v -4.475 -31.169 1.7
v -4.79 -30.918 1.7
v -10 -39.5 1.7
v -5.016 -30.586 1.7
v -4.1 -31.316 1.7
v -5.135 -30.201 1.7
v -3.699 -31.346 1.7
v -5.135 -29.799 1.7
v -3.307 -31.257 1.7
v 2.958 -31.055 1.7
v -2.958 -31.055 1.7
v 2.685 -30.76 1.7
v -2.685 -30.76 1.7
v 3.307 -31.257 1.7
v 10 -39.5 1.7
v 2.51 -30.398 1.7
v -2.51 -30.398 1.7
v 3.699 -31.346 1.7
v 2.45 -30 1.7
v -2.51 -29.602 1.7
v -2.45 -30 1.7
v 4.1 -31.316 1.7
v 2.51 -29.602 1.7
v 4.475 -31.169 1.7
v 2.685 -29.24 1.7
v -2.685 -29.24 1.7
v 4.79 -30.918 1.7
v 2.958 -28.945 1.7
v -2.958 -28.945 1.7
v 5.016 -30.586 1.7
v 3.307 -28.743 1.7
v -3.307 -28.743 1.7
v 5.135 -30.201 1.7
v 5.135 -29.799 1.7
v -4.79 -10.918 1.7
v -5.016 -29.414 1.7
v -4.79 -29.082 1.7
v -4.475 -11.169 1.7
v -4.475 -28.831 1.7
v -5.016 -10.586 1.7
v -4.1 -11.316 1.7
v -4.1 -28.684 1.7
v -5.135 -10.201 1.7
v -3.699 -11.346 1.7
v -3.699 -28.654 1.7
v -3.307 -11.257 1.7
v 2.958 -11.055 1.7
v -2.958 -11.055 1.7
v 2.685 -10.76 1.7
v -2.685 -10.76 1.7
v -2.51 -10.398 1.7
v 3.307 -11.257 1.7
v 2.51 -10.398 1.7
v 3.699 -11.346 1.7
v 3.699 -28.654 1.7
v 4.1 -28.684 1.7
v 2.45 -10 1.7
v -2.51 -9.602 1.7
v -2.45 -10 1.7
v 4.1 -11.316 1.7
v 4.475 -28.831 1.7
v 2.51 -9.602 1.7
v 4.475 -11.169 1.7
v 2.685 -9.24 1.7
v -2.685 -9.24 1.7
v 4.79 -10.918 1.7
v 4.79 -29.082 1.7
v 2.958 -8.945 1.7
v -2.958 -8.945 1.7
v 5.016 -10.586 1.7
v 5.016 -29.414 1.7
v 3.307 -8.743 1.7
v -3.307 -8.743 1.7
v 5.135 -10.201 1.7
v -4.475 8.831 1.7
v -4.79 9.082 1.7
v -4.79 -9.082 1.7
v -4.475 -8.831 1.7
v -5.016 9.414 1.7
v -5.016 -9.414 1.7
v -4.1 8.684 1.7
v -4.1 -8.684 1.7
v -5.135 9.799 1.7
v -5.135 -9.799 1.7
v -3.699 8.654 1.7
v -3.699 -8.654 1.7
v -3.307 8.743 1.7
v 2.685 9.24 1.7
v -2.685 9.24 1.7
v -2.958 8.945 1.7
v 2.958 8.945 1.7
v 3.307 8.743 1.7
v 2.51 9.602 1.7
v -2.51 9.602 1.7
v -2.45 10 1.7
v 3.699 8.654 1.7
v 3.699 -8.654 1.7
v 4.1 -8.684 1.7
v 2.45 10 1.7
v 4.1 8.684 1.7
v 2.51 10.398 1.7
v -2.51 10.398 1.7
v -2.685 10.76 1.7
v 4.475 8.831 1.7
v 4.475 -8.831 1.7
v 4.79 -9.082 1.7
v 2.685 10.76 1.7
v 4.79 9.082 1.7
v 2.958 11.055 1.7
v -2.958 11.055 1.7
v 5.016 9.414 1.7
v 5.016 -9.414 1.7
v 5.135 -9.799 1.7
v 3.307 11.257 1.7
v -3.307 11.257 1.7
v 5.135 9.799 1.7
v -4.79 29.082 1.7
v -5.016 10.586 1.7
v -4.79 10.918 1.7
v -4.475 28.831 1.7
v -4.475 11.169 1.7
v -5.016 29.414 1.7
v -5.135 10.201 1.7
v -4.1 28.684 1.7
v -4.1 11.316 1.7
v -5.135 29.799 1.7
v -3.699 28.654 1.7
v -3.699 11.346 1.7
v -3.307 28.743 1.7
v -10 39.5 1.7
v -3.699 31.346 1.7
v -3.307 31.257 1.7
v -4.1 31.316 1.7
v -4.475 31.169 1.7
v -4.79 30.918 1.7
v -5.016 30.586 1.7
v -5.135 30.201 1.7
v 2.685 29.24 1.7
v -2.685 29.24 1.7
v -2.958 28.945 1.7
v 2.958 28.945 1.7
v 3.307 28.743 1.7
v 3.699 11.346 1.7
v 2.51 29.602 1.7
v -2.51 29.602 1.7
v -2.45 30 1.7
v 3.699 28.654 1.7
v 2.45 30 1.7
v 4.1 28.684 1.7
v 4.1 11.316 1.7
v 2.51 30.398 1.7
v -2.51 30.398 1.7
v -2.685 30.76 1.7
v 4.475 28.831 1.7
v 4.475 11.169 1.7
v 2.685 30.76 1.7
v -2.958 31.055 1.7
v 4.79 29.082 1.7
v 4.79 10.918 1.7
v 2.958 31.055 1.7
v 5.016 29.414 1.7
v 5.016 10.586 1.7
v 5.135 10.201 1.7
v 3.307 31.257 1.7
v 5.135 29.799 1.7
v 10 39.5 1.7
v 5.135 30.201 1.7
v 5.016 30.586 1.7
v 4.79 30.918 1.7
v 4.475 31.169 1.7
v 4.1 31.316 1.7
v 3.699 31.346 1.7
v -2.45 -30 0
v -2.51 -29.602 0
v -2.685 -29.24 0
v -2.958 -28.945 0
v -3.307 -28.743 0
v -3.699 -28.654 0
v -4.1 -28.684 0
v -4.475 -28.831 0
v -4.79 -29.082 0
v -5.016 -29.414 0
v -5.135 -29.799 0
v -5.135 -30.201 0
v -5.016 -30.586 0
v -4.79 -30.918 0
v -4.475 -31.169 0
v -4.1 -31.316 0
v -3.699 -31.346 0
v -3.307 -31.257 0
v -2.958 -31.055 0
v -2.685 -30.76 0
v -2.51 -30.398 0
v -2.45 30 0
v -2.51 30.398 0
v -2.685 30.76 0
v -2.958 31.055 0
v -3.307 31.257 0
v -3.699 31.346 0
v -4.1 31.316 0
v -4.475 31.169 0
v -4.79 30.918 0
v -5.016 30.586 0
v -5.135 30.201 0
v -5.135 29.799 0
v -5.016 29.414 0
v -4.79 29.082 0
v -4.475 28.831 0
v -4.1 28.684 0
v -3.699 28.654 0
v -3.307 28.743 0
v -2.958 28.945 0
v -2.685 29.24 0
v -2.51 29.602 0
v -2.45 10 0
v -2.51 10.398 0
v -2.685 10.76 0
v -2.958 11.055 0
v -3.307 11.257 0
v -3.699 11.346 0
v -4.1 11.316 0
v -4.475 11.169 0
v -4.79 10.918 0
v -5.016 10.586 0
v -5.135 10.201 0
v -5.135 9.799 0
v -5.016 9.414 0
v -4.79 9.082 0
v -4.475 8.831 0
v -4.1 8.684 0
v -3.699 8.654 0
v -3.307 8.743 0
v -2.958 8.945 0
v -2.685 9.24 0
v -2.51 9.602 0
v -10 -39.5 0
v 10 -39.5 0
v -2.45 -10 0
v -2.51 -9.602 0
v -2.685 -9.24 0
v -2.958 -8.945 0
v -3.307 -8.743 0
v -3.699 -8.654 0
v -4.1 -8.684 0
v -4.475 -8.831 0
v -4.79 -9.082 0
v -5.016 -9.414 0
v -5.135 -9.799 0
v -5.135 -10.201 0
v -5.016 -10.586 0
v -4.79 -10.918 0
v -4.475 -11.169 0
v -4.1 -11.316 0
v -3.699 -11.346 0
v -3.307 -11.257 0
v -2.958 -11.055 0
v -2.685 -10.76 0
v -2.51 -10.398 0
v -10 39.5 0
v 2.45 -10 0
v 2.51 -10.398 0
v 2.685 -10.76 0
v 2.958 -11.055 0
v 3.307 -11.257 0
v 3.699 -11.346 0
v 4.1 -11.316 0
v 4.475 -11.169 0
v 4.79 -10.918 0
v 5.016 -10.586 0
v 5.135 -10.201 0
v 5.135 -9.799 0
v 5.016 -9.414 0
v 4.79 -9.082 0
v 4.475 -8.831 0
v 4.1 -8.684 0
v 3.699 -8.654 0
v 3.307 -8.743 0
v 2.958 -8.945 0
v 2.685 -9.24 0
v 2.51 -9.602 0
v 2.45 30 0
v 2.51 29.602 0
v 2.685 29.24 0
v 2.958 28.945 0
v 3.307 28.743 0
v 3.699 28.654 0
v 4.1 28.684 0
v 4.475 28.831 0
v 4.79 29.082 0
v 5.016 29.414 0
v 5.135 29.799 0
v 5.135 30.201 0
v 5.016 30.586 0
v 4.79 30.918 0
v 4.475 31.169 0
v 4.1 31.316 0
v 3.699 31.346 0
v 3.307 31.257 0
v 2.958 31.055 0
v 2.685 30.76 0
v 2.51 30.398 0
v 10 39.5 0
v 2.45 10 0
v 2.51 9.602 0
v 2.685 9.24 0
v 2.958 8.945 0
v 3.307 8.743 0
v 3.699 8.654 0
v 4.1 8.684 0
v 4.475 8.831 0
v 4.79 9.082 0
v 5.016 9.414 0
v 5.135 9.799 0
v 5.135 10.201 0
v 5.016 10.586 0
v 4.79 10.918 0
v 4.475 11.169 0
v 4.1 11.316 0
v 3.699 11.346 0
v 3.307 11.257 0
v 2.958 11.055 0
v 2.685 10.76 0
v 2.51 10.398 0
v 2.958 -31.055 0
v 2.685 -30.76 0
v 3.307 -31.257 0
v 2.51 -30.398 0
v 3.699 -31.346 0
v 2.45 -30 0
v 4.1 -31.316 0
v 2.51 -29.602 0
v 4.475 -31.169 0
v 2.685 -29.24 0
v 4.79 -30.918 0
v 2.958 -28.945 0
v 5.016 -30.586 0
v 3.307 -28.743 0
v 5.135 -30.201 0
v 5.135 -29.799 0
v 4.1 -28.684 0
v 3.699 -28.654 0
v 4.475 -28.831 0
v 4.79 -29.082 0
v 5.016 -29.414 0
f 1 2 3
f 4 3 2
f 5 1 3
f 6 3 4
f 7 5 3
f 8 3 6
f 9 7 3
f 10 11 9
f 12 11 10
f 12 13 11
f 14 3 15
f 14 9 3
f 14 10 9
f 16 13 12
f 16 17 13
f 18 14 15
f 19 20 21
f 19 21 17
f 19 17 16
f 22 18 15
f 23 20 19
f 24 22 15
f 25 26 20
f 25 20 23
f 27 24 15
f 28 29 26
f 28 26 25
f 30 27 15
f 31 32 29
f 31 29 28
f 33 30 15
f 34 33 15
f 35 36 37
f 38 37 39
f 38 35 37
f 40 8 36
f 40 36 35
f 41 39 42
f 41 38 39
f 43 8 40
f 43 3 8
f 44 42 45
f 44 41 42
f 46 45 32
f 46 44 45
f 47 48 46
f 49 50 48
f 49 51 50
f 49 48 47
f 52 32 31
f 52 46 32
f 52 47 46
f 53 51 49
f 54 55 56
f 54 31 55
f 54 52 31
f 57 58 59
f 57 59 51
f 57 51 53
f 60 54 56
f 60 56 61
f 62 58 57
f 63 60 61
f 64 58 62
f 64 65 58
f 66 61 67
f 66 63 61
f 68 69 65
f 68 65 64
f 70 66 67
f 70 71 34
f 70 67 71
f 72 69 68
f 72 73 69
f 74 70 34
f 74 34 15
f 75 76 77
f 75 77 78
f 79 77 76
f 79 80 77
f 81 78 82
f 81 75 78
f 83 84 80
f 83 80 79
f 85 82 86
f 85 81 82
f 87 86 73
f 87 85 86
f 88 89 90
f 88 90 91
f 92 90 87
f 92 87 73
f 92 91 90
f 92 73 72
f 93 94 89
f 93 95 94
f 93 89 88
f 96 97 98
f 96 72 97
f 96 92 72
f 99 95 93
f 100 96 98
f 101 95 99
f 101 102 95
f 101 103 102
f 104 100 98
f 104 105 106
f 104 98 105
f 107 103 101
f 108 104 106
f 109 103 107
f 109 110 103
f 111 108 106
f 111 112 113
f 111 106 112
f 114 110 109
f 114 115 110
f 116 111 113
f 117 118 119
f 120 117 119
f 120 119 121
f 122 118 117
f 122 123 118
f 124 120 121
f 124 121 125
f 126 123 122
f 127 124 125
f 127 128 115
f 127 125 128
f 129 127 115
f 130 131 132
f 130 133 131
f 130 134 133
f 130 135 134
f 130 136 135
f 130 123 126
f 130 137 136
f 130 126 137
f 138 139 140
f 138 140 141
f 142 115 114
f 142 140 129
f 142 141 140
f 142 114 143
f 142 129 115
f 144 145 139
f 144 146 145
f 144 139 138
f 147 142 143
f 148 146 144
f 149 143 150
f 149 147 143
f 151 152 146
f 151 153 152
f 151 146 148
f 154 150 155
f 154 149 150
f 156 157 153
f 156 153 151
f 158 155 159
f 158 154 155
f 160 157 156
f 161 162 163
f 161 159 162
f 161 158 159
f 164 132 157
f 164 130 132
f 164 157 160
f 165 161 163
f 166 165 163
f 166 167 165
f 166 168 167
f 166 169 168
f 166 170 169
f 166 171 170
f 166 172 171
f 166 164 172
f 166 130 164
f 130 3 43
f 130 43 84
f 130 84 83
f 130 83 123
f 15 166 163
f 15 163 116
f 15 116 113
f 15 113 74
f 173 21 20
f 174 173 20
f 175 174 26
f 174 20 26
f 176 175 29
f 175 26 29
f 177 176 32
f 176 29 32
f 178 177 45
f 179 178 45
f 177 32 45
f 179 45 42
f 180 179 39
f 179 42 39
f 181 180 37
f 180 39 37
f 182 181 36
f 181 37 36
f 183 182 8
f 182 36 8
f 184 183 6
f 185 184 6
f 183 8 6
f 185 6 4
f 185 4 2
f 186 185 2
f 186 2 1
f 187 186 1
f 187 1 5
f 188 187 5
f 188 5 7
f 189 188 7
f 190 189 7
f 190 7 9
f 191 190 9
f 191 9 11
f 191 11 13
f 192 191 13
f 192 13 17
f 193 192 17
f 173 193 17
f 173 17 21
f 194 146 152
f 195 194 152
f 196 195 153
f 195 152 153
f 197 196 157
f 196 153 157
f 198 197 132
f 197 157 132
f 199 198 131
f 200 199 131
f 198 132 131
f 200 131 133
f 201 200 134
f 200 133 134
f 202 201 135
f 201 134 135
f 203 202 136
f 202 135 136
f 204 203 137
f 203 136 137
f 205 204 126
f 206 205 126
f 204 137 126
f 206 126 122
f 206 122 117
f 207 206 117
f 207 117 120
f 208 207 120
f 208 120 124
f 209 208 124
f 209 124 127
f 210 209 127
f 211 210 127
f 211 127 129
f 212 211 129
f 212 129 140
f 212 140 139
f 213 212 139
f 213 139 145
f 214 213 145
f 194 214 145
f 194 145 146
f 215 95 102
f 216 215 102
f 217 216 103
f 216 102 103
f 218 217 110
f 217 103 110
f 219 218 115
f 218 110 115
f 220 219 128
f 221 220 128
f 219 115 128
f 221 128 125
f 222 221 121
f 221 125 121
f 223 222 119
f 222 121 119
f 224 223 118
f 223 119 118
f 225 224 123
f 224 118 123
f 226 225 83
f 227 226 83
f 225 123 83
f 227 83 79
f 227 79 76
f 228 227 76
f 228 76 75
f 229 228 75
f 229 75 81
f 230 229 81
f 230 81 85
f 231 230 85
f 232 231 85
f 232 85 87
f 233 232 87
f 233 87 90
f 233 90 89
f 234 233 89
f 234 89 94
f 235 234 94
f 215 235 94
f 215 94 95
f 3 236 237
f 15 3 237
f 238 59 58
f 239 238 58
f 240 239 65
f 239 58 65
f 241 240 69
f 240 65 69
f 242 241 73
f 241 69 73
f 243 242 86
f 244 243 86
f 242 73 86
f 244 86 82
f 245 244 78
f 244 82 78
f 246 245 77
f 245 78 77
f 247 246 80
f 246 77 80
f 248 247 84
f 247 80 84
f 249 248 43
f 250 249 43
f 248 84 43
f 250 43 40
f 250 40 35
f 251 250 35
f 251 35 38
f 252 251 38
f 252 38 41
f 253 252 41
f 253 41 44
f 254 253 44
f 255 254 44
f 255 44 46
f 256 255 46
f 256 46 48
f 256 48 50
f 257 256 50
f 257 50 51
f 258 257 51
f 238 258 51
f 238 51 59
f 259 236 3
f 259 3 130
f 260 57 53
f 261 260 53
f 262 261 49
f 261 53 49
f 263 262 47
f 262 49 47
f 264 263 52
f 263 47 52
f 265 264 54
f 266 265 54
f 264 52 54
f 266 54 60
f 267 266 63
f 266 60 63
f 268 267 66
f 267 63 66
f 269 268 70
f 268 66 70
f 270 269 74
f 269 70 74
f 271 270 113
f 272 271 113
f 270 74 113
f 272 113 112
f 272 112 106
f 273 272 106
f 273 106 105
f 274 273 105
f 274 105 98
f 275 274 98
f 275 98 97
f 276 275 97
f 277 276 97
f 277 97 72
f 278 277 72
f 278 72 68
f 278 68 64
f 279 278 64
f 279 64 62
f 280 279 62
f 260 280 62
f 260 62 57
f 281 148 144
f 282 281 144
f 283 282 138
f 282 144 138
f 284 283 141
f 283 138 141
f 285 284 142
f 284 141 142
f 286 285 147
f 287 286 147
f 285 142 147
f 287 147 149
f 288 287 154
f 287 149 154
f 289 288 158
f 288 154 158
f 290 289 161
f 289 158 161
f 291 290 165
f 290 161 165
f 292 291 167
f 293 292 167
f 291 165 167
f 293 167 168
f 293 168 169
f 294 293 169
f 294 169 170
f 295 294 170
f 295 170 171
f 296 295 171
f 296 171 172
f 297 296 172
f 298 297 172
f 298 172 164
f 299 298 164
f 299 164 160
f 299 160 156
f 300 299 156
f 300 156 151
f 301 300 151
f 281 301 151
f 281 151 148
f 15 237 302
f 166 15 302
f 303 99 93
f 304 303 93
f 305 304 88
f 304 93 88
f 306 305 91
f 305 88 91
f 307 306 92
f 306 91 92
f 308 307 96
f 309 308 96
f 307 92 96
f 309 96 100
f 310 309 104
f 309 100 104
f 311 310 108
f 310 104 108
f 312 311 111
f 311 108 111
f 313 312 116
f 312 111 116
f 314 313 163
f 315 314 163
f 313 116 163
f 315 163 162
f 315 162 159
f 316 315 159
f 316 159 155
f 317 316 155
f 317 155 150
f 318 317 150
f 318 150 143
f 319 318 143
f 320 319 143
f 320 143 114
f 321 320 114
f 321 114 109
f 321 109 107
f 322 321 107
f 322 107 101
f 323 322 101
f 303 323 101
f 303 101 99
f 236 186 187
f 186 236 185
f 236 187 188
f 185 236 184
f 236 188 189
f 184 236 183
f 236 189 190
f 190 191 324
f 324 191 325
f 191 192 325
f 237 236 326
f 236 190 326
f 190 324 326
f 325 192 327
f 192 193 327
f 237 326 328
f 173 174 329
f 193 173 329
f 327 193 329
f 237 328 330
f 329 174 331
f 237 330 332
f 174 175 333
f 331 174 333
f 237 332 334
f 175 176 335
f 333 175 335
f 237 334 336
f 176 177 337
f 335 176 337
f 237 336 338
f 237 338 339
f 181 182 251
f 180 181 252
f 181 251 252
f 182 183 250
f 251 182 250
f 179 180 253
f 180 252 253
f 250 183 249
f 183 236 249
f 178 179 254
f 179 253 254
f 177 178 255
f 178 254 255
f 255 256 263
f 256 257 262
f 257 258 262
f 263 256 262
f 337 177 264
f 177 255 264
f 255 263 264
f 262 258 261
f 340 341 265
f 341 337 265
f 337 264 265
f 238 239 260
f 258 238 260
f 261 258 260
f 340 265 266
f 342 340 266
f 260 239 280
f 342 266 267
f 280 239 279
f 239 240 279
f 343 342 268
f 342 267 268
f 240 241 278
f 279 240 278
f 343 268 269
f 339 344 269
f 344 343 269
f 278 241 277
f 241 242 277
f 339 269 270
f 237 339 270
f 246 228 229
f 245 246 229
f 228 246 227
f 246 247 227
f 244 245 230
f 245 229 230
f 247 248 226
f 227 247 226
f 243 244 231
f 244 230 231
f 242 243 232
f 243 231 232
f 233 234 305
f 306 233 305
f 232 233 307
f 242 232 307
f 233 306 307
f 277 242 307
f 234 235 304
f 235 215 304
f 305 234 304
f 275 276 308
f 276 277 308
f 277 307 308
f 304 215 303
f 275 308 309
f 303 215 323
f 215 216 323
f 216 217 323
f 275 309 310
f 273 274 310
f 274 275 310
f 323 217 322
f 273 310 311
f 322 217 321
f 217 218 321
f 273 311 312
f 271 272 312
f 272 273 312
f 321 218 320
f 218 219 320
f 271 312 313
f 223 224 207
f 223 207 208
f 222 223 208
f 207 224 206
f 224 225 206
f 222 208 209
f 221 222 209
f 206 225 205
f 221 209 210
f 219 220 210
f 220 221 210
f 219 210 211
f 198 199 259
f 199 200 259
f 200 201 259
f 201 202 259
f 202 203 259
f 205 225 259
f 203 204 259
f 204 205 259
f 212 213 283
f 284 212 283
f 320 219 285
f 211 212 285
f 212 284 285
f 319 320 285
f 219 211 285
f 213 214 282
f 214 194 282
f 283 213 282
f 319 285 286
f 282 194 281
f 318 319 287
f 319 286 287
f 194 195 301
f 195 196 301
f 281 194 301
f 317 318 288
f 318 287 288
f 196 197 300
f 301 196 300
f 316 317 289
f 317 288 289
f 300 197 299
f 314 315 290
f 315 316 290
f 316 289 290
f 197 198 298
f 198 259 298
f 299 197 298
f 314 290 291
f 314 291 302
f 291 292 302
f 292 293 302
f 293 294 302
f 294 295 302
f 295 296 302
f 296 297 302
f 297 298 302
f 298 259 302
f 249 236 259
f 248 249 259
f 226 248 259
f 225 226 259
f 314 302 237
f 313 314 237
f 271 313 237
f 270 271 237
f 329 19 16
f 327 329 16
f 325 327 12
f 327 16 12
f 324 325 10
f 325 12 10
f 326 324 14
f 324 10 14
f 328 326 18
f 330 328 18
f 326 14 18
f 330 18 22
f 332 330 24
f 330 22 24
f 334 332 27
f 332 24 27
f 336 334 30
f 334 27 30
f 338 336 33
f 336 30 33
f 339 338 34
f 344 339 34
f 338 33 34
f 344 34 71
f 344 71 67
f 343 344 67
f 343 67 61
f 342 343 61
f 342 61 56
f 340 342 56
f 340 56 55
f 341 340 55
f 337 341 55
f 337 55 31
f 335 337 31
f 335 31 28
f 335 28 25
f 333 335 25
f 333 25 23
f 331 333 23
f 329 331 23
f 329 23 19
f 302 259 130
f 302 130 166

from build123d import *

# Parameters (mm, degrees)
SKETCH1_W           = 20
SKETCH1_H           = 79
BOSS_EXTRUDE1_DEPTH = 1.7
SKETCH3_R           = 1.35
CUT_EXTRUDE1_DEPTH  = 41.781613504


with BuildPart() as part:
    # Sketch1 → Boss-Extrude1 (new body)
    with BuildSketch(Plane.XY):
        Rectangle(SKETCH1_W, SKETCH1_H)
    extrude(amount=BOSS_EXTRUDE1_DEPTH)

    # Sketch3 → Cut-Extrude1 (cut, through all)
    with BuildSketch(Plane.XY.offset(1.7)):
        with Locations((-3.8, 30)):
            Circle(SKETCH3_R)
        with Locations((-3.8, 10)):
            Circle(SKETCH3_R)
        with Locations((-3.8, -10)):
            Circle(SKETCH3_R)
        with Locations((-3.8, -30)):
            Circle(SKETCH3_R)
        with Locations(Location((3.8, -30, 0), (0, 0, 180))):
            Circle(SKETCH3_R)
        with Locations(Location((3.8, -10, 0), (0, 0, 180))):
            Circle(SKETCH3_R)
        with Locations(Location((3.8, 10, 0), (0, 0, 180))):
            Circle(SKETCH3_R)
        with Locations(Location((3.8, 30, 0), (0, 0, 180))):
            Circle(SKETCH3_R)
    extrude(amount=-CUT_EXTRUDE1_DEPTH, mode=Mode.SUBTRACT)


solid = part.part
